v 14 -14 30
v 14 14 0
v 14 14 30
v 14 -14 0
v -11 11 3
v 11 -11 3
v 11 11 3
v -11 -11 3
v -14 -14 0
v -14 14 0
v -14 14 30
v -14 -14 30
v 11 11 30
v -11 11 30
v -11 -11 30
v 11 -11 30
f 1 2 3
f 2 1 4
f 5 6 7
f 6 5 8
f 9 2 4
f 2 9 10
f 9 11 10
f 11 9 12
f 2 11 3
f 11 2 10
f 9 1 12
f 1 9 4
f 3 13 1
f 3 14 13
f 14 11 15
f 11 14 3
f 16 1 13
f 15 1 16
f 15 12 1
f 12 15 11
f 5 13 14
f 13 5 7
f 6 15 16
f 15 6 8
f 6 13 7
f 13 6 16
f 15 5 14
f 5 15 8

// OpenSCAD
squareDimension = 28;
width = squareDimension;
depth = squareDimension;
height = 30;
thickness = 3;
open = false;


translate([0,0,thickness/2])
cube([width, depth, thickness], center = true);

translate([0,(depth-thickness)/2,height/2])
cube([width, thickness, height], center = true);
if(open) {} else {
    translate([0,-(depth-thickness)/2,height/2])
    cube([width, thickness, height], center = true);
}
translate([(width-thickness)/2,0,height/2])
cube([thickness, depth, height], center = true);
translate([-(width-thickness)/2,0,height/2])
cube([thickness, depth, height], center = true);
